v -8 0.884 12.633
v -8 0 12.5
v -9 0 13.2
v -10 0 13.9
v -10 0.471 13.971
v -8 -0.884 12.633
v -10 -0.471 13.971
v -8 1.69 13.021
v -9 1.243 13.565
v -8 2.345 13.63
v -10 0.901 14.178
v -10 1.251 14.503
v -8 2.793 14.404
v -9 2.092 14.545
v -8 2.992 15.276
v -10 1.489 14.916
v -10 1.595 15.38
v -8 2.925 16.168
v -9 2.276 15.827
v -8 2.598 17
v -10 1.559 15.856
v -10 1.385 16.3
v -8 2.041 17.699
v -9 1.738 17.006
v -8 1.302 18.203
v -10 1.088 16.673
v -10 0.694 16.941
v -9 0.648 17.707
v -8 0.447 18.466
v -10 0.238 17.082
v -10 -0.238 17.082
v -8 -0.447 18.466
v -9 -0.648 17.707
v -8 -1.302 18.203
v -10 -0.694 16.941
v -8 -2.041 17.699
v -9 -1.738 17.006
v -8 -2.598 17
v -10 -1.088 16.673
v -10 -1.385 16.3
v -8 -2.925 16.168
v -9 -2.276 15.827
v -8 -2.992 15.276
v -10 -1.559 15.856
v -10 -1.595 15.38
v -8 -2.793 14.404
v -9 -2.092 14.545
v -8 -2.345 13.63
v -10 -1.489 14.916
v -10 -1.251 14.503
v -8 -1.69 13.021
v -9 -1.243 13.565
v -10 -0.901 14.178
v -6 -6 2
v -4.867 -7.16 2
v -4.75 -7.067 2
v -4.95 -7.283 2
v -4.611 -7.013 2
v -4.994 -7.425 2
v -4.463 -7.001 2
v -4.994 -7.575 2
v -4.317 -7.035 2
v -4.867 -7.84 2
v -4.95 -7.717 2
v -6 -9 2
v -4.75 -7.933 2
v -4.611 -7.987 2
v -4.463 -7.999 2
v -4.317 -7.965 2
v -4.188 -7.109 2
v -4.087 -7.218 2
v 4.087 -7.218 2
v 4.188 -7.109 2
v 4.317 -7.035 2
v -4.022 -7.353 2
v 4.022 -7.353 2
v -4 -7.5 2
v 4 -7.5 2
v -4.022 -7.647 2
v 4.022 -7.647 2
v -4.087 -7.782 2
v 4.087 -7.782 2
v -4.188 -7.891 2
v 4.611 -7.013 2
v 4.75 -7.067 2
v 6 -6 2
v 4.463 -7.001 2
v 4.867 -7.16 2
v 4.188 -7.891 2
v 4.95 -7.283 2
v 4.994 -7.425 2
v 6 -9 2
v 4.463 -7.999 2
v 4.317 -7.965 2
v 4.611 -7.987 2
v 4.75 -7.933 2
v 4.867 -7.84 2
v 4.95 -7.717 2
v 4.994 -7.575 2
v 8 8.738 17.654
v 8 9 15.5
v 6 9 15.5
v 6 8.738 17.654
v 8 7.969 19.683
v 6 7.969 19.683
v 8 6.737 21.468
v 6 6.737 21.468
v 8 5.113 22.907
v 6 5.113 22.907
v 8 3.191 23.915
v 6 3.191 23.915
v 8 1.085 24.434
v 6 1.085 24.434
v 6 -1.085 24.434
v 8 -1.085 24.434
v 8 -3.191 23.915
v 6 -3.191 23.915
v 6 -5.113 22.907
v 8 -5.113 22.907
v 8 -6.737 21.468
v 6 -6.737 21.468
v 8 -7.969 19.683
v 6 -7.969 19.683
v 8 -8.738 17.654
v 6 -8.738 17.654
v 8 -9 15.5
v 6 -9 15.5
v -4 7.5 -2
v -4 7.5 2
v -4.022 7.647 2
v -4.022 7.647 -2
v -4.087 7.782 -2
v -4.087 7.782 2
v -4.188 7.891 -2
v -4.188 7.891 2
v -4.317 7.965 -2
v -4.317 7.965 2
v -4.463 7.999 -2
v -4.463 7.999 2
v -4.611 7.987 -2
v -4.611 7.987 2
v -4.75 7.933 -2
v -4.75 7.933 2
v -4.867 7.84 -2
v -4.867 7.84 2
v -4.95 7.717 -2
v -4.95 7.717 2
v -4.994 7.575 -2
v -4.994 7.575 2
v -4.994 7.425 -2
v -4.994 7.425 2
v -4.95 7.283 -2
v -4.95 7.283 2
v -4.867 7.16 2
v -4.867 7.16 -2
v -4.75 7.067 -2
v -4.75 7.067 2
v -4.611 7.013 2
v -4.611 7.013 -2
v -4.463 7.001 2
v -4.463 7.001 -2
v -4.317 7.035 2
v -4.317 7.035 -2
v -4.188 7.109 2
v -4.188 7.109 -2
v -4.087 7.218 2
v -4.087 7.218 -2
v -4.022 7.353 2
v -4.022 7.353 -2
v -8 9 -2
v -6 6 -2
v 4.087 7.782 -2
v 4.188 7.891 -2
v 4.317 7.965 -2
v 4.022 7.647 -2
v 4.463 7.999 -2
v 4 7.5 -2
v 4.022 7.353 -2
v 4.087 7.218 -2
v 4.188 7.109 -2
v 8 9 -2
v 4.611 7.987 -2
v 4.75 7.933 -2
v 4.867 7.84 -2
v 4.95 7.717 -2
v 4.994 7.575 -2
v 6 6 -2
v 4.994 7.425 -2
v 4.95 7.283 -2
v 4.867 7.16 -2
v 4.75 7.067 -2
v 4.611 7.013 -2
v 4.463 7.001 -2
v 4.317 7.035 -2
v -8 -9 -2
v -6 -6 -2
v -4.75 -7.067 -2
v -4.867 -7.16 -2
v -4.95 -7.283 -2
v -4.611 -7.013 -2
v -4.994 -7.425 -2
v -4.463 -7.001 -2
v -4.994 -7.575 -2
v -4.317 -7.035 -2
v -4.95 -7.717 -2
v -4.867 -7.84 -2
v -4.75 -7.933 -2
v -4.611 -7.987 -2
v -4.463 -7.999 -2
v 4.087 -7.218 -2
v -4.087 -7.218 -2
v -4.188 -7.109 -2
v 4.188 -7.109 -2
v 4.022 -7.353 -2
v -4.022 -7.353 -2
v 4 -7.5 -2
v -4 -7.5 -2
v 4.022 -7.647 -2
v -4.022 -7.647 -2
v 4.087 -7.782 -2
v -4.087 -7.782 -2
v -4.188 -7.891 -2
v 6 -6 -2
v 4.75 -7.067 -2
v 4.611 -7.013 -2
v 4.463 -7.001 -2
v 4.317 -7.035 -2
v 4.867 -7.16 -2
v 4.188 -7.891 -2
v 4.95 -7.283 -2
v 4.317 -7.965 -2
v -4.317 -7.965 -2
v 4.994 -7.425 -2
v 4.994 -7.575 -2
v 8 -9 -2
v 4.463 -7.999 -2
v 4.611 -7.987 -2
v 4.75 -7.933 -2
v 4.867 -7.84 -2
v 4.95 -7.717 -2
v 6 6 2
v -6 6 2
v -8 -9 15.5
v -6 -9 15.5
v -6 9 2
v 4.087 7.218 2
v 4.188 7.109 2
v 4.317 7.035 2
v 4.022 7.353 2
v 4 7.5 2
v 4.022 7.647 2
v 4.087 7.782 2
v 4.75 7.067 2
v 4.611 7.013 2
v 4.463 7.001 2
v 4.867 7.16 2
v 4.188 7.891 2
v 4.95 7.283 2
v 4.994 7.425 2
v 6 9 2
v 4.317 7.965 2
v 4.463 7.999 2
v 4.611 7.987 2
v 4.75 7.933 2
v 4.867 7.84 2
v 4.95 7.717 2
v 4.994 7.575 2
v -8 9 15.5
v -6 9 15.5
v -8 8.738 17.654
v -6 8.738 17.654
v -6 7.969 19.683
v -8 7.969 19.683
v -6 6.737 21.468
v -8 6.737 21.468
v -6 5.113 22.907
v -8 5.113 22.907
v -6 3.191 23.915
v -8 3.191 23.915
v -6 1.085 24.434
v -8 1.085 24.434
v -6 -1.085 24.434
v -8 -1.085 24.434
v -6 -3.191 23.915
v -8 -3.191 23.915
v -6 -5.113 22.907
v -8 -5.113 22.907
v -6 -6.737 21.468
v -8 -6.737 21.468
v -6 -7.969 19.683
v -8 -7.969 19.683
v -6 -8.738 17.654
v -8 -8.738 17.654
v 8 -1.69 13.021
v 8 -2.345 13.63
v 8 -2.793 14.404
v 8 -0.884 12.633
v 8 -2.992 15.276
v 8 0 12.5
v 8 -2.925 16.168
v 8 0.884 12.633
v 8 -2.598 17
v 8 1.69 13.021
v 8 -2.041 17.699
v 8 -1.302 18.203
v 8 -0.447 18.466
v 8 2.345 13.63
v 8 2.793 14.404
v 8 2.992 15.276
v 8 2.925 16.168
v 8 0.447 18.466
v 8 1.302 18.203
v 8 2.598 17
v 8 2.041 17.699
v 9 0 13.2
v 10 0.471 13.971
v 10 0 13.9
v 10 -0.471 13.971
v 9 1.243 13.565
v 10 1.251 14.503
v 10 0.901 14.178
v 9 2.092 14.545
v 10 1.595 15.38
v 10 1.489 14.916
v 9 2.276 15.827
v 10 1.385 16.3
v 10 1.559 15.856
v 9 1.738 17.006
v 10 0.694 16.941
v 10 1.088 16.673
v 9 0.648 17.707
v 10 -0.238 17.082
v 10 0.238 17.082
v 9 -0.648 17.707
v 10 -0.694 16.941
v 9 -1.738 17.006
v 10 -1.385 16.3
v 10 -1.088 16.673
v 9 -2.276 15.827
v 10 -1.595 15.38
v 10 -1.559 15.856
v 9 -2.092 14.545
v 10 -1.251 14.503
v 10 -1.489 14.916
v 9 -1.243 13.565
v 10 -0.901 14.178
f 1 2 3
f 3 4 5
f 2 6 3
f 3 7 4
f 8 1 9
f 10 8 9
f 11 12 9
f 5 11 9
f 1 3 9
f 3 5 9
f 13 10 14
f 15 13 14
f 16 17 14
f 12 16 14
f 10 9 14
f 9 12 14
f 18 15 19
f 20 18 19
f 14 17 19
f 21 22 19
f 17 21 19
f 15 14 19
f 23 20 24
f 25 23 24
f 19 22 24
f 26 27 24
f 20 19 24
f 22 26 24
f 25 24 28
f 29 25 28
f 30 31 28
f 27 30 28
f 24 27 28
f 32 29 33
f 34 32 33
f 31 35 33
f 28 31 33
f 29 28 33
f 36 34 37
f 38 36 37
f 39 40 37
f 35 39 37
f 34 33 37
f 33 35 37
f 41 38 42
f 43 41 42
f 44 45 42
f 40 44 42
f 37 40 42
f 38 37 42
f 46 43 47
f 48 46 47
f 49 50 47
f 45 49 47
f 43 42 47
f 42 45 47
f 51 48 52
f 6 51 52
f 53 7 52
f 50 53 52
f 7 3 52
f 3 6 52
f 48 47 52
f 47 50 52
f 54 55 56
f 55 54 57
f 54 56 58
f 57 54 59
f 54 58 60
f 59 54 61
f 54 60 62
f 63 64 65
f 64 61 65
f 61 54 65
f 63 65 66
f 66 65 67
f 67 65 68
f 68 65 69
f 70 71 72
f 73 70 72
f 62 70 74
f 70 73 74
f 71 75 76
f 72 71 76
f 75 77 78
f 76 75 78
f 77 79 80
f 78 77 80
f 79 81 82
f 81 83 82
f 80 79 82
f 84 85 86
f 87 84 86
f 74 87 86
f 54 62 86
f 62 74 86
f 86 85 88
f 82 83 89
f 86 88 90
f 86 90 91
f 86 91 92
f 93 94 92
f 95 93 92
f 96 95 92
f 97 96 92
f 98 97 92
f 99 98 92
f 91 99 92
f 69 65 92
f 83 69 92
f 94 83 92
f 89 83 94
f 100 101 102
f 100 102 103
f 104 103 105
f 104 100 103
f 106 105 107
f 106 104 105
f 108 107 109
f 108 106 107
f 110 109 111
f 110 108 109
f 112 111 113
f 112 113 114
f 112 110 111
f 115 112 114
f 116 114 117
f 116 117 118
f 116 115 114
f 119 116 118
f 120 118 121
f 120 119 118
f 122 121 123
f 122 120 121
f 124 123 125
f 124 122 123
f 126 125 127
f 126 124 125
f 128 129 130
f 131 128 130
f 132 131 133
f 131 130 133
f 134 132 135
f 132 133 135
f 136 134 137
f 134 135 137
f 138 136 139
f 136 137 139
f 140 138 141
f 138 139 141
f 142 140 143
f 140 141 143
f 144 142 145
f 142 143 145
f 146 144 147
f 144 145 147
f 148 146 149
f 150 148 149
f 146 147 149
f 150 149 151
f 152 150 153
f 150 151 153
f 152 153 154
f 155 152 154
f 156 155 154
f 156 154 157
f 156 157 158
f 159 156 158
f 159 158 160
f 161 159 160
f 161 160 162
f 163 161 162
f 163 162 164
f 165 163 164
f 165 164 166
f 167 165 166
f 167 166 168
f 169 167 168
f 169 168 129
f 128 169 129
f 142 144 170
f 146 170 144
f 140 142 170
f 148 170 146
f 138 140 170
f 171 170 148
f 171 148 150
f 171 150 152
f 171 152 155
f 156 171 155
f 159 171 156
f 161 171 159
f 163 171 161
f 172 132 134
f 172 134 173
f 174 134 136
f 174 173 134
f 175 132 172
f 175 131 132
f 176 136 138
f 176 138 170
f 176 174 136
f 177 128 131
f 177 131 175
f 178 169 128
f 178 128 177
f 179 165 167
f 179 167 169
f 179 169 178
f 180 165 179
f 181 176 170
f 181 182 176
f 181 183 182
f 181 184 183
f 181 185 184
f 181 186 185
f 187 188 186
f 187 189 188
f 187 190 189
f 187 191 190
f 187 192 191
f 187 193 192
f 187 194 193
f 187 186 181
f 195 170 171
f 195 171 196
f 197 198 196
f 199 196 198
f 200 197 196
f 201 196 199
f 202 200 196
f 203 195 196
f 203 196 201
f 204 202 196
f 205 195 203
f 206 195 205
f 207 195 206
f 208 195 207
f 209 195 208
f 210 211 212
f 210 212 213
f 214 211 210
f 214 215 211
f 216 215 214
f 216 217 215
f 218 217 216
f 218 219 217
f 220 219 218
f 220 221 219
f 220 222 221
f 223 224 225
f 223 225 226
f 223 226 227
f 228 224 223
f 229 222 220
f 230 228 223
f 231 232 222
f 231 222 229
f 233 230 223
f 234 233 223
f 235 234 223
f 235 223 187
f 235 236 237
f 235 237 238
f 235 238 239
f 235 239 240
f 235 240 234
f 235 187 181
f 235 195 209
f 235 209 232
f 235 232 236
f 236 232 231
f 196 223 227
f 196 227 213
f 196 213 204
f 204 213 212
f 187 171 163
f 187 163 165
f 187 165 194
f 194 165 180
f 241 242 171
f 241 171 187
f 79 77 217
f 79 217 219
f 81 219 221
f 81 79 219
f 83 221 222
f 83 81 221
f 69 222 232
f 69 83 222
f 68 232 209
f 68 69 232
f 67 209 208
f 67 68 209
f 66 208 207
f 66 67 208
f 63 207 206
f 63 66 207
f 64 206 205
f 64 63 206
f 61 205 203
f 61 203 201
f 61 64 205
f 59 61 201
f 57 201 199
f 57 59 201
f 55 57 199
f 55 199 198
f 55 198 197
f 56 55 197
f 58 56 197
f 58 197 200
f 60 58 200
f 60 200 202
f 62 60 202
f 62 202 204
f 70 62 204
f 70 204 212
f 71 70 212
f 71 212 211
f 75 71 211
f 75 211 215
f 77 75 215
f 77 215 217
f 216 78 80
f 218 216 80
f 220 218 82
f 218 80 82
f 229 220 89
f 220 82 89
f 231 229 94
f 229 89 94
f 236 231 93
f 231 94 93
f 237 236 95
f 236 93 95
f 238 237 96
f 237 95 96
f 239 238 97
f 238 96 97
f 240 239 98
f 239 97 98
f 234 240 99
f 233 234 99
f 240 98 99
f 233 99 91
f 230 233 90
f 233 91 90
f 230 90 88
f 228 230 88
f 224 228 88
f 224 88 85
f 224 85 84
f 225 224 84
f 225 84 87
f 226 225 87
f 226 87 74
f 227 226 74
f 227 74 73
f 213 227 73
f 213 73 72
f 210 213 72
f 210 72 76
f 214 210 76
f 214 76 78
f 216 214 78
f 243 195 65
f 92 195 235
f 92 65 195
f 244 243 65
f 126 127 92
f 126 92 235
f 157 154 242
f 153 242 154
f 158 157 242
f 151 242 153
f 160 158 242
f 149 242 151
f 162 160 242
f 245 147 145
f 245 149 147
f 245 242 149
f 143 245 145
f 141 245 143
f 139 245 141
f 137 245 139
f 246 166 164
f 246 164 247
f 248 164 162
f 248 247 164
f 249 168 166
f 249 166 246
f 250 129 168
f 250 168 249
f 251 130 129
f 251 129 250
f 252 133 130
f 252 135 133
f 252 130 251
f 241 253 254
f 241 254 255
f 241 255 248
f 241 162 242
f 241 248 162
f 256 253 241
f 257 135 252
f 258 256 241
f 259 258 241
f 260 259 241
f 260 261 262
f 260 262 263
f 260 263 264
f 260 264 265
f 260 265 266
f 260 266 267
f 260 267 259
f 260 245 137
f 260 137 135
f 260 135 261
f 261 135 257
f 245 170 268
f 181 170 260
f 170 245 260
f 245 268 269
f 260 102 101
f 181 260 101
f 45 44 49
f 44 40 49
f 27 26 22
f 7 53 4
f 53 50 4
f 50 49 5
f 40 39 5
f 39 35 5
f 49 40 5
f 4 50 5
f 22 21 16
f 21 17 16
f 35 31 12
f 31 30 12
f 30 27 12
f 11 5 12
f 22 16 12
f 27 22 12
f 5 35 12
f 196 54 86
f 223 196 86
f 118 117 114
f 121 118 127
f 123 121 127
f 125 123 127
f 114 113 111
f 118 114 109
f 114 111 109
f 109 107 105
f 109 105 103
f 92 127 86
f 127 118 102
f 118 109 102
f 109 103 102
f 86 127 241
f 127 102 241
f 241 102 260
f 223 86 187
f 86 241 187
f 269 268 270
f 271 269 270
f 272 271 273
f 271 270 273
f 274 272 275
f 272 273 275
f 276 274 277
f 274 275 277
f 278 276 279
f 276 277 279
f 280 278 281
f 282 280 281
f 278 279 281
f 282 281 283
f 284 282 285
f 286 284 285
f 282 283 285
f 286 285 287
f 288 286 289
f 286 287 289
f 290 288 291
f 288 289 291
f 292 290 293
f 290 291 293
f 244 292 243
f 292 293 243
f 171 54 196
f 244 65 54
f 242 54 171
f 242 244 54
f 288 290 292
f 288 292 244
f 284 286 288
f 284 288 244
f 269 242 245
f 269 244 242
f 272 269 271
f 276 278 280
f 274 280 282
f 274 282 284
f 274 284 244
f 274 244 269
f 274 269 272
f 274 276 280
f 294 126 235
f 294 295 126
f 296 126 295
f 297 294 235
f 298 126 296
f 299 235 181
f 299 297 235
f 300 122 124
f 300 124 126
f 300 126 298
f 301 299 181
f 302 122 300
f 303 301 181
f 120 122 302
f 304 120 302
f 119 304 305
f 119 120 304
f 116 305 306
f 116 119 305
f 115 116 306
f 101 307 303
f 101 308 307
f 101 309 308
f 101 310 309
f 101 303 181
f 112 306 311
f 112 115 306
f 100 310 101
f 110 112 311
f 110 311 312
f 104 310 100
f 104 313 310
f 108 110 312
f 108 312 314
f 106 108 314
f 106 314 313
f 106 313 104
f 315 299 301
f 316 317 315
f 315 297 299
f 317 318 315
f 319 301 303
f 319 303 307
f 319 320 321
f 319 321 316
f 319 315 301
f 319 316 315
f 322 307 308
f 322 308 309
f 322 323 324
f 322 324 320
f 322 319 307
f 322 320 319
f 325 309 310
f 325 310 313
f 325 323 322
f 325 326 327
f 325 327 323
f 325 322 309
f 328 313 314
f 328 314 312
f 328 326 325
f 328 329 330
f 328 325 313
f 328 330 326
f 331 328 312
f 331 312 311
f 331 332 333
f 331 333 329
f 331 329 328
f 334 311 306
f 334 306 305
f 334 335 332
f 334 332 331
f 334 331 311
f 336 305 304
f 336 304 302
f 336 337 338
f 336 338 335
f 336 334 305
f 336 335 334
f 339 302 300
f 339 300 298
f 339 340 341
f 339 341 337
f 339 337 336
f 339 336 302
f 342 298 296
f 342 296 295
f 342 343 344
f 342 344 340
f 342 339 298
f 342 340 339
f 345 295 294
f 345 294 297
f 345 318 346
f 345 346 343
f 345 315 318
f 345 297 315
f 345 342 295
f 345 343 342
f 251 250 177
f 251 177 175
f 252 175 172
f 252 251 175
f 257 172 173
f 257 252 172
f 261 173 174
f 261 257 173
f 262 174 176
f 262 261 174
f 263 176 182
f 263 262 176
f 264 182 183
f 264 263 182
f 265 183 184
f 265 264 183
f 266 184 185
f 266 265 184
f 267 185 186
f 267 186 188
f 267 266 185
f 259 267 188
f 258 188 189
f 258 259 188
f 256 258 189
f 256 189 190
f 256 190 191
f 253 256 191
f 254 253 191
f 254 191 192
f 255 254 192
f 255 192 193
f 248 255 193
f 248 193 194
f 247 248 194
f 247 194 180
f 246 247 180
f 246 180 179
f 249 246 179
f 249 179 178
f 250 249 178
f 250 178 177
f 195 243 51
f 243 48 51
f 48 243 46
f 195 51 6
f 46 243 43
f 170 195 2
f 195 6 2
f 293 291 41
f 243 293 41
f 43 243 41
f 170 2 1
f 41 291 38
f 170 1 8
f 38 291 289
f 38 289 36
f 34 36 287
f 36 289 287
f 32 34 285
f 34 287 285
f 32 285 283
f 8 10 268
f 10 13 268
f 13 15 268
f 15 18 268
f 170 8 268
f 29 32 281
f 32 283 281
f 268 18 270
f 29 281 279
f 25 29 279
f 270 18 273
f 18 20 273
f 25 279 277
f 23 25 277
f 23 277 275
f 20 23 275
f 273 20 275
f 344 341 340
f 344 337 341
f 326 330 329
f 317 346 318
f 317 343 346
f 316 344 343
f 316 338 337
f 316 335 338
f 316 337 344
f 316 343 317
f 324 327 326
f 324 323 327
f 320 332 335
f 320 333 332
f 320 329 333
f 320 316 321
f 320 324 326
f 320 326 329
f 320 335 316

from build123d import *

# Parameters (mm, degrees)
SKETCH1_W                                  = 16
SKETCH1_H                                  = 18
SKETCH1_W_2                                = 12
SKETCH1_H_2                                = 14
EXTRUDE_THIN1_DEPTH                        = 2
BOSS_EXTRUDE1_DEPTH                        = 2
SKETCH3_R                                  = 3
BOSS_EXTRUDE2_DEPTH                        = 2
BOSS_EXTRUDE2_TAPER                        = 35
SKETCH13_W                                 = 12
SKETCH13_H                                 = 1
BOSS_EXTRUDE4_DEPTH                        = 4
CUT_EXTRUDE5_REACH                         = 28.215
SKETCH11_R                                 = 0.5
MIRROR4_AT_THE_SECOND_PLANE_COPY_1_REACH   = 28.215
MIRROR4_AT_THE_SECOND_PLANE_COPY_1_SKETC_R = 0.5


with BuildPart() as part:
    # Sketch1 → Extrude-Thin1 (new, symmetric)
    with BuildSketch(Plane.XY):
        Rectangle(SKETCH1_W, SKETCH1_H)
        Rectangle(SKETCH1_W_2, SKETCH1_H_2, mode=Mode.SUBTRACT)
    extrude_thin1 = extrude(amount=EXTRUDE_THIN1_DEPTH, both=True)

    # Sketch2 → Boss-Extrude1 (add)
    with BuildSketch(Plane(origin=(8, 0, 0), x_dir=(0, 0, -1), z_dir=(1, 0, 0))):
        with BuildLine():
            Line((2, 9), (-15.5, 9))
            ThreePointArc((-15.5, 9), (-24.5, 0), (-15.5, -9))
            Line((-15.5, -9), (2, -9))
            Line((2, -9), (2, 9))
        make_face()
    boss_extrude1 = extrude(amount=-BOSS_EXTRUDE1_DEPTH)

    # Sketch3 → Boss-Extrude2 (add)
    with BuildSketch(Plane(origin=(8, 0, 0), x_dir=(0, 0, -1), z_dir=(1, 0, 0))):
        with Locations((-15.5, 0)):
            Circle(SKETCH3_R)
    boss_extrude2 = extrude(amount=BOSS_EXTRUDE2_DEPTH, taper=BOSS_EXTRUDE2_TAPER)

    # Mirror3: Extrude-Thin1, Boss-Extrude1, Boss-Extrude2 across plane
    add(extrude_thin1.mirror(Plane(origin=(0, 0, 0), x_dir=(0, 0, 1), z_dir=(1, 0, 0))))
    add(boss_extrude1.mirror(Plane(origin=(0, 0, 0), x_dir=(0, 0, 1), z_dir=(1, 0, 0))))
    add(boss_extrude2.mirror(Plane(origin=(0, 0, 0), x_dir=(0, 0, 1), z_dir=(1, 0, 0))))

    # Sketch13 → Boss-Extrude4 (add)
    with BuildSketch(Plane.XY.offset(2)):
        with Locations((0, 6.5)):
            Rectangle(SKETCH13_W, SKETCH13_H)
    boss_extrude4 = extrude(amount=-BOSS_EXTRUDE4_DEPTH)

    # Mirror5: Boss-Extrude4 across plane
    add(boss_extrude4.mirror(Plane.ZX))

    # Sketch11 → Cut-Extrude5 (cut, up to next)
    with BuildSketch(Plane.XY.offset(2), mode=Mode.PRIVATE) as cut_extrude5_sk1:
        with Locations((-4.5, 7.5)):
            Circle(SKETCH11_R)
    cut_extrude5_tool1 = extrude(cut_extrude5_sk1.sketch, amount=-CUT_EXTRUDE5_REACH, mode=Mode.PRIVATE) & part.part
    cut_extrude5 = cut_extrude5_tool1.solids().sort_by_distance((-4.5, 7.5, 2))[0]
    add(cut_extrude5, mode=Mode.SUBTRACT)

    # Mirror4: Cut-Extrude5 across plane
    add(cut_extrude5.mirror(Plane.ZX), mode=Mode.SUBTRACT)

    # Mirror4 at the second plane: Cut-Extrude5 across plane
    add(cut_extrude5.mirror(Plane(origin=(0, 0, 0), x_dir=(0, 0, 1), z_dir=(1, 0, 0))), mode=Mode.SUBTRACT)

    # Mirror4 at the second plane copy 1 sketc → Mirror4 at the second plane copy 1 (cut, up to next)
    with BuildSketch(Plane(origin=(0, 0, 2), x_dir=(-1, 0, 0), z_dir=(0, 0, 1)), mode=Mode.PRIVATE) as mirror4_at_the_second_plane_copy_1_sk1:
        with Locations((-4.5, 7.5)):
            Circle(MIRROR4_AT_THE_SECOND_PLANE_COPY_1_SKETC_R)
    mirror4_at_the_second_plane_copy_1_tool1 = extrude(mirror4_at_the_second_plane_copy_1_sk1.sketch, amount=-MIRROR4_AT_THE_SECOND_PLANE_COPY_1_REACH, mode=Mode.PRIVATE) & part.part
    add(mirror4_at_the_second_plane_copy_1_tool1.solids().sort_by_distance((4.5, -7.5, 2))[0], mode=Mode.SUBTRACT)


solid = part.part
